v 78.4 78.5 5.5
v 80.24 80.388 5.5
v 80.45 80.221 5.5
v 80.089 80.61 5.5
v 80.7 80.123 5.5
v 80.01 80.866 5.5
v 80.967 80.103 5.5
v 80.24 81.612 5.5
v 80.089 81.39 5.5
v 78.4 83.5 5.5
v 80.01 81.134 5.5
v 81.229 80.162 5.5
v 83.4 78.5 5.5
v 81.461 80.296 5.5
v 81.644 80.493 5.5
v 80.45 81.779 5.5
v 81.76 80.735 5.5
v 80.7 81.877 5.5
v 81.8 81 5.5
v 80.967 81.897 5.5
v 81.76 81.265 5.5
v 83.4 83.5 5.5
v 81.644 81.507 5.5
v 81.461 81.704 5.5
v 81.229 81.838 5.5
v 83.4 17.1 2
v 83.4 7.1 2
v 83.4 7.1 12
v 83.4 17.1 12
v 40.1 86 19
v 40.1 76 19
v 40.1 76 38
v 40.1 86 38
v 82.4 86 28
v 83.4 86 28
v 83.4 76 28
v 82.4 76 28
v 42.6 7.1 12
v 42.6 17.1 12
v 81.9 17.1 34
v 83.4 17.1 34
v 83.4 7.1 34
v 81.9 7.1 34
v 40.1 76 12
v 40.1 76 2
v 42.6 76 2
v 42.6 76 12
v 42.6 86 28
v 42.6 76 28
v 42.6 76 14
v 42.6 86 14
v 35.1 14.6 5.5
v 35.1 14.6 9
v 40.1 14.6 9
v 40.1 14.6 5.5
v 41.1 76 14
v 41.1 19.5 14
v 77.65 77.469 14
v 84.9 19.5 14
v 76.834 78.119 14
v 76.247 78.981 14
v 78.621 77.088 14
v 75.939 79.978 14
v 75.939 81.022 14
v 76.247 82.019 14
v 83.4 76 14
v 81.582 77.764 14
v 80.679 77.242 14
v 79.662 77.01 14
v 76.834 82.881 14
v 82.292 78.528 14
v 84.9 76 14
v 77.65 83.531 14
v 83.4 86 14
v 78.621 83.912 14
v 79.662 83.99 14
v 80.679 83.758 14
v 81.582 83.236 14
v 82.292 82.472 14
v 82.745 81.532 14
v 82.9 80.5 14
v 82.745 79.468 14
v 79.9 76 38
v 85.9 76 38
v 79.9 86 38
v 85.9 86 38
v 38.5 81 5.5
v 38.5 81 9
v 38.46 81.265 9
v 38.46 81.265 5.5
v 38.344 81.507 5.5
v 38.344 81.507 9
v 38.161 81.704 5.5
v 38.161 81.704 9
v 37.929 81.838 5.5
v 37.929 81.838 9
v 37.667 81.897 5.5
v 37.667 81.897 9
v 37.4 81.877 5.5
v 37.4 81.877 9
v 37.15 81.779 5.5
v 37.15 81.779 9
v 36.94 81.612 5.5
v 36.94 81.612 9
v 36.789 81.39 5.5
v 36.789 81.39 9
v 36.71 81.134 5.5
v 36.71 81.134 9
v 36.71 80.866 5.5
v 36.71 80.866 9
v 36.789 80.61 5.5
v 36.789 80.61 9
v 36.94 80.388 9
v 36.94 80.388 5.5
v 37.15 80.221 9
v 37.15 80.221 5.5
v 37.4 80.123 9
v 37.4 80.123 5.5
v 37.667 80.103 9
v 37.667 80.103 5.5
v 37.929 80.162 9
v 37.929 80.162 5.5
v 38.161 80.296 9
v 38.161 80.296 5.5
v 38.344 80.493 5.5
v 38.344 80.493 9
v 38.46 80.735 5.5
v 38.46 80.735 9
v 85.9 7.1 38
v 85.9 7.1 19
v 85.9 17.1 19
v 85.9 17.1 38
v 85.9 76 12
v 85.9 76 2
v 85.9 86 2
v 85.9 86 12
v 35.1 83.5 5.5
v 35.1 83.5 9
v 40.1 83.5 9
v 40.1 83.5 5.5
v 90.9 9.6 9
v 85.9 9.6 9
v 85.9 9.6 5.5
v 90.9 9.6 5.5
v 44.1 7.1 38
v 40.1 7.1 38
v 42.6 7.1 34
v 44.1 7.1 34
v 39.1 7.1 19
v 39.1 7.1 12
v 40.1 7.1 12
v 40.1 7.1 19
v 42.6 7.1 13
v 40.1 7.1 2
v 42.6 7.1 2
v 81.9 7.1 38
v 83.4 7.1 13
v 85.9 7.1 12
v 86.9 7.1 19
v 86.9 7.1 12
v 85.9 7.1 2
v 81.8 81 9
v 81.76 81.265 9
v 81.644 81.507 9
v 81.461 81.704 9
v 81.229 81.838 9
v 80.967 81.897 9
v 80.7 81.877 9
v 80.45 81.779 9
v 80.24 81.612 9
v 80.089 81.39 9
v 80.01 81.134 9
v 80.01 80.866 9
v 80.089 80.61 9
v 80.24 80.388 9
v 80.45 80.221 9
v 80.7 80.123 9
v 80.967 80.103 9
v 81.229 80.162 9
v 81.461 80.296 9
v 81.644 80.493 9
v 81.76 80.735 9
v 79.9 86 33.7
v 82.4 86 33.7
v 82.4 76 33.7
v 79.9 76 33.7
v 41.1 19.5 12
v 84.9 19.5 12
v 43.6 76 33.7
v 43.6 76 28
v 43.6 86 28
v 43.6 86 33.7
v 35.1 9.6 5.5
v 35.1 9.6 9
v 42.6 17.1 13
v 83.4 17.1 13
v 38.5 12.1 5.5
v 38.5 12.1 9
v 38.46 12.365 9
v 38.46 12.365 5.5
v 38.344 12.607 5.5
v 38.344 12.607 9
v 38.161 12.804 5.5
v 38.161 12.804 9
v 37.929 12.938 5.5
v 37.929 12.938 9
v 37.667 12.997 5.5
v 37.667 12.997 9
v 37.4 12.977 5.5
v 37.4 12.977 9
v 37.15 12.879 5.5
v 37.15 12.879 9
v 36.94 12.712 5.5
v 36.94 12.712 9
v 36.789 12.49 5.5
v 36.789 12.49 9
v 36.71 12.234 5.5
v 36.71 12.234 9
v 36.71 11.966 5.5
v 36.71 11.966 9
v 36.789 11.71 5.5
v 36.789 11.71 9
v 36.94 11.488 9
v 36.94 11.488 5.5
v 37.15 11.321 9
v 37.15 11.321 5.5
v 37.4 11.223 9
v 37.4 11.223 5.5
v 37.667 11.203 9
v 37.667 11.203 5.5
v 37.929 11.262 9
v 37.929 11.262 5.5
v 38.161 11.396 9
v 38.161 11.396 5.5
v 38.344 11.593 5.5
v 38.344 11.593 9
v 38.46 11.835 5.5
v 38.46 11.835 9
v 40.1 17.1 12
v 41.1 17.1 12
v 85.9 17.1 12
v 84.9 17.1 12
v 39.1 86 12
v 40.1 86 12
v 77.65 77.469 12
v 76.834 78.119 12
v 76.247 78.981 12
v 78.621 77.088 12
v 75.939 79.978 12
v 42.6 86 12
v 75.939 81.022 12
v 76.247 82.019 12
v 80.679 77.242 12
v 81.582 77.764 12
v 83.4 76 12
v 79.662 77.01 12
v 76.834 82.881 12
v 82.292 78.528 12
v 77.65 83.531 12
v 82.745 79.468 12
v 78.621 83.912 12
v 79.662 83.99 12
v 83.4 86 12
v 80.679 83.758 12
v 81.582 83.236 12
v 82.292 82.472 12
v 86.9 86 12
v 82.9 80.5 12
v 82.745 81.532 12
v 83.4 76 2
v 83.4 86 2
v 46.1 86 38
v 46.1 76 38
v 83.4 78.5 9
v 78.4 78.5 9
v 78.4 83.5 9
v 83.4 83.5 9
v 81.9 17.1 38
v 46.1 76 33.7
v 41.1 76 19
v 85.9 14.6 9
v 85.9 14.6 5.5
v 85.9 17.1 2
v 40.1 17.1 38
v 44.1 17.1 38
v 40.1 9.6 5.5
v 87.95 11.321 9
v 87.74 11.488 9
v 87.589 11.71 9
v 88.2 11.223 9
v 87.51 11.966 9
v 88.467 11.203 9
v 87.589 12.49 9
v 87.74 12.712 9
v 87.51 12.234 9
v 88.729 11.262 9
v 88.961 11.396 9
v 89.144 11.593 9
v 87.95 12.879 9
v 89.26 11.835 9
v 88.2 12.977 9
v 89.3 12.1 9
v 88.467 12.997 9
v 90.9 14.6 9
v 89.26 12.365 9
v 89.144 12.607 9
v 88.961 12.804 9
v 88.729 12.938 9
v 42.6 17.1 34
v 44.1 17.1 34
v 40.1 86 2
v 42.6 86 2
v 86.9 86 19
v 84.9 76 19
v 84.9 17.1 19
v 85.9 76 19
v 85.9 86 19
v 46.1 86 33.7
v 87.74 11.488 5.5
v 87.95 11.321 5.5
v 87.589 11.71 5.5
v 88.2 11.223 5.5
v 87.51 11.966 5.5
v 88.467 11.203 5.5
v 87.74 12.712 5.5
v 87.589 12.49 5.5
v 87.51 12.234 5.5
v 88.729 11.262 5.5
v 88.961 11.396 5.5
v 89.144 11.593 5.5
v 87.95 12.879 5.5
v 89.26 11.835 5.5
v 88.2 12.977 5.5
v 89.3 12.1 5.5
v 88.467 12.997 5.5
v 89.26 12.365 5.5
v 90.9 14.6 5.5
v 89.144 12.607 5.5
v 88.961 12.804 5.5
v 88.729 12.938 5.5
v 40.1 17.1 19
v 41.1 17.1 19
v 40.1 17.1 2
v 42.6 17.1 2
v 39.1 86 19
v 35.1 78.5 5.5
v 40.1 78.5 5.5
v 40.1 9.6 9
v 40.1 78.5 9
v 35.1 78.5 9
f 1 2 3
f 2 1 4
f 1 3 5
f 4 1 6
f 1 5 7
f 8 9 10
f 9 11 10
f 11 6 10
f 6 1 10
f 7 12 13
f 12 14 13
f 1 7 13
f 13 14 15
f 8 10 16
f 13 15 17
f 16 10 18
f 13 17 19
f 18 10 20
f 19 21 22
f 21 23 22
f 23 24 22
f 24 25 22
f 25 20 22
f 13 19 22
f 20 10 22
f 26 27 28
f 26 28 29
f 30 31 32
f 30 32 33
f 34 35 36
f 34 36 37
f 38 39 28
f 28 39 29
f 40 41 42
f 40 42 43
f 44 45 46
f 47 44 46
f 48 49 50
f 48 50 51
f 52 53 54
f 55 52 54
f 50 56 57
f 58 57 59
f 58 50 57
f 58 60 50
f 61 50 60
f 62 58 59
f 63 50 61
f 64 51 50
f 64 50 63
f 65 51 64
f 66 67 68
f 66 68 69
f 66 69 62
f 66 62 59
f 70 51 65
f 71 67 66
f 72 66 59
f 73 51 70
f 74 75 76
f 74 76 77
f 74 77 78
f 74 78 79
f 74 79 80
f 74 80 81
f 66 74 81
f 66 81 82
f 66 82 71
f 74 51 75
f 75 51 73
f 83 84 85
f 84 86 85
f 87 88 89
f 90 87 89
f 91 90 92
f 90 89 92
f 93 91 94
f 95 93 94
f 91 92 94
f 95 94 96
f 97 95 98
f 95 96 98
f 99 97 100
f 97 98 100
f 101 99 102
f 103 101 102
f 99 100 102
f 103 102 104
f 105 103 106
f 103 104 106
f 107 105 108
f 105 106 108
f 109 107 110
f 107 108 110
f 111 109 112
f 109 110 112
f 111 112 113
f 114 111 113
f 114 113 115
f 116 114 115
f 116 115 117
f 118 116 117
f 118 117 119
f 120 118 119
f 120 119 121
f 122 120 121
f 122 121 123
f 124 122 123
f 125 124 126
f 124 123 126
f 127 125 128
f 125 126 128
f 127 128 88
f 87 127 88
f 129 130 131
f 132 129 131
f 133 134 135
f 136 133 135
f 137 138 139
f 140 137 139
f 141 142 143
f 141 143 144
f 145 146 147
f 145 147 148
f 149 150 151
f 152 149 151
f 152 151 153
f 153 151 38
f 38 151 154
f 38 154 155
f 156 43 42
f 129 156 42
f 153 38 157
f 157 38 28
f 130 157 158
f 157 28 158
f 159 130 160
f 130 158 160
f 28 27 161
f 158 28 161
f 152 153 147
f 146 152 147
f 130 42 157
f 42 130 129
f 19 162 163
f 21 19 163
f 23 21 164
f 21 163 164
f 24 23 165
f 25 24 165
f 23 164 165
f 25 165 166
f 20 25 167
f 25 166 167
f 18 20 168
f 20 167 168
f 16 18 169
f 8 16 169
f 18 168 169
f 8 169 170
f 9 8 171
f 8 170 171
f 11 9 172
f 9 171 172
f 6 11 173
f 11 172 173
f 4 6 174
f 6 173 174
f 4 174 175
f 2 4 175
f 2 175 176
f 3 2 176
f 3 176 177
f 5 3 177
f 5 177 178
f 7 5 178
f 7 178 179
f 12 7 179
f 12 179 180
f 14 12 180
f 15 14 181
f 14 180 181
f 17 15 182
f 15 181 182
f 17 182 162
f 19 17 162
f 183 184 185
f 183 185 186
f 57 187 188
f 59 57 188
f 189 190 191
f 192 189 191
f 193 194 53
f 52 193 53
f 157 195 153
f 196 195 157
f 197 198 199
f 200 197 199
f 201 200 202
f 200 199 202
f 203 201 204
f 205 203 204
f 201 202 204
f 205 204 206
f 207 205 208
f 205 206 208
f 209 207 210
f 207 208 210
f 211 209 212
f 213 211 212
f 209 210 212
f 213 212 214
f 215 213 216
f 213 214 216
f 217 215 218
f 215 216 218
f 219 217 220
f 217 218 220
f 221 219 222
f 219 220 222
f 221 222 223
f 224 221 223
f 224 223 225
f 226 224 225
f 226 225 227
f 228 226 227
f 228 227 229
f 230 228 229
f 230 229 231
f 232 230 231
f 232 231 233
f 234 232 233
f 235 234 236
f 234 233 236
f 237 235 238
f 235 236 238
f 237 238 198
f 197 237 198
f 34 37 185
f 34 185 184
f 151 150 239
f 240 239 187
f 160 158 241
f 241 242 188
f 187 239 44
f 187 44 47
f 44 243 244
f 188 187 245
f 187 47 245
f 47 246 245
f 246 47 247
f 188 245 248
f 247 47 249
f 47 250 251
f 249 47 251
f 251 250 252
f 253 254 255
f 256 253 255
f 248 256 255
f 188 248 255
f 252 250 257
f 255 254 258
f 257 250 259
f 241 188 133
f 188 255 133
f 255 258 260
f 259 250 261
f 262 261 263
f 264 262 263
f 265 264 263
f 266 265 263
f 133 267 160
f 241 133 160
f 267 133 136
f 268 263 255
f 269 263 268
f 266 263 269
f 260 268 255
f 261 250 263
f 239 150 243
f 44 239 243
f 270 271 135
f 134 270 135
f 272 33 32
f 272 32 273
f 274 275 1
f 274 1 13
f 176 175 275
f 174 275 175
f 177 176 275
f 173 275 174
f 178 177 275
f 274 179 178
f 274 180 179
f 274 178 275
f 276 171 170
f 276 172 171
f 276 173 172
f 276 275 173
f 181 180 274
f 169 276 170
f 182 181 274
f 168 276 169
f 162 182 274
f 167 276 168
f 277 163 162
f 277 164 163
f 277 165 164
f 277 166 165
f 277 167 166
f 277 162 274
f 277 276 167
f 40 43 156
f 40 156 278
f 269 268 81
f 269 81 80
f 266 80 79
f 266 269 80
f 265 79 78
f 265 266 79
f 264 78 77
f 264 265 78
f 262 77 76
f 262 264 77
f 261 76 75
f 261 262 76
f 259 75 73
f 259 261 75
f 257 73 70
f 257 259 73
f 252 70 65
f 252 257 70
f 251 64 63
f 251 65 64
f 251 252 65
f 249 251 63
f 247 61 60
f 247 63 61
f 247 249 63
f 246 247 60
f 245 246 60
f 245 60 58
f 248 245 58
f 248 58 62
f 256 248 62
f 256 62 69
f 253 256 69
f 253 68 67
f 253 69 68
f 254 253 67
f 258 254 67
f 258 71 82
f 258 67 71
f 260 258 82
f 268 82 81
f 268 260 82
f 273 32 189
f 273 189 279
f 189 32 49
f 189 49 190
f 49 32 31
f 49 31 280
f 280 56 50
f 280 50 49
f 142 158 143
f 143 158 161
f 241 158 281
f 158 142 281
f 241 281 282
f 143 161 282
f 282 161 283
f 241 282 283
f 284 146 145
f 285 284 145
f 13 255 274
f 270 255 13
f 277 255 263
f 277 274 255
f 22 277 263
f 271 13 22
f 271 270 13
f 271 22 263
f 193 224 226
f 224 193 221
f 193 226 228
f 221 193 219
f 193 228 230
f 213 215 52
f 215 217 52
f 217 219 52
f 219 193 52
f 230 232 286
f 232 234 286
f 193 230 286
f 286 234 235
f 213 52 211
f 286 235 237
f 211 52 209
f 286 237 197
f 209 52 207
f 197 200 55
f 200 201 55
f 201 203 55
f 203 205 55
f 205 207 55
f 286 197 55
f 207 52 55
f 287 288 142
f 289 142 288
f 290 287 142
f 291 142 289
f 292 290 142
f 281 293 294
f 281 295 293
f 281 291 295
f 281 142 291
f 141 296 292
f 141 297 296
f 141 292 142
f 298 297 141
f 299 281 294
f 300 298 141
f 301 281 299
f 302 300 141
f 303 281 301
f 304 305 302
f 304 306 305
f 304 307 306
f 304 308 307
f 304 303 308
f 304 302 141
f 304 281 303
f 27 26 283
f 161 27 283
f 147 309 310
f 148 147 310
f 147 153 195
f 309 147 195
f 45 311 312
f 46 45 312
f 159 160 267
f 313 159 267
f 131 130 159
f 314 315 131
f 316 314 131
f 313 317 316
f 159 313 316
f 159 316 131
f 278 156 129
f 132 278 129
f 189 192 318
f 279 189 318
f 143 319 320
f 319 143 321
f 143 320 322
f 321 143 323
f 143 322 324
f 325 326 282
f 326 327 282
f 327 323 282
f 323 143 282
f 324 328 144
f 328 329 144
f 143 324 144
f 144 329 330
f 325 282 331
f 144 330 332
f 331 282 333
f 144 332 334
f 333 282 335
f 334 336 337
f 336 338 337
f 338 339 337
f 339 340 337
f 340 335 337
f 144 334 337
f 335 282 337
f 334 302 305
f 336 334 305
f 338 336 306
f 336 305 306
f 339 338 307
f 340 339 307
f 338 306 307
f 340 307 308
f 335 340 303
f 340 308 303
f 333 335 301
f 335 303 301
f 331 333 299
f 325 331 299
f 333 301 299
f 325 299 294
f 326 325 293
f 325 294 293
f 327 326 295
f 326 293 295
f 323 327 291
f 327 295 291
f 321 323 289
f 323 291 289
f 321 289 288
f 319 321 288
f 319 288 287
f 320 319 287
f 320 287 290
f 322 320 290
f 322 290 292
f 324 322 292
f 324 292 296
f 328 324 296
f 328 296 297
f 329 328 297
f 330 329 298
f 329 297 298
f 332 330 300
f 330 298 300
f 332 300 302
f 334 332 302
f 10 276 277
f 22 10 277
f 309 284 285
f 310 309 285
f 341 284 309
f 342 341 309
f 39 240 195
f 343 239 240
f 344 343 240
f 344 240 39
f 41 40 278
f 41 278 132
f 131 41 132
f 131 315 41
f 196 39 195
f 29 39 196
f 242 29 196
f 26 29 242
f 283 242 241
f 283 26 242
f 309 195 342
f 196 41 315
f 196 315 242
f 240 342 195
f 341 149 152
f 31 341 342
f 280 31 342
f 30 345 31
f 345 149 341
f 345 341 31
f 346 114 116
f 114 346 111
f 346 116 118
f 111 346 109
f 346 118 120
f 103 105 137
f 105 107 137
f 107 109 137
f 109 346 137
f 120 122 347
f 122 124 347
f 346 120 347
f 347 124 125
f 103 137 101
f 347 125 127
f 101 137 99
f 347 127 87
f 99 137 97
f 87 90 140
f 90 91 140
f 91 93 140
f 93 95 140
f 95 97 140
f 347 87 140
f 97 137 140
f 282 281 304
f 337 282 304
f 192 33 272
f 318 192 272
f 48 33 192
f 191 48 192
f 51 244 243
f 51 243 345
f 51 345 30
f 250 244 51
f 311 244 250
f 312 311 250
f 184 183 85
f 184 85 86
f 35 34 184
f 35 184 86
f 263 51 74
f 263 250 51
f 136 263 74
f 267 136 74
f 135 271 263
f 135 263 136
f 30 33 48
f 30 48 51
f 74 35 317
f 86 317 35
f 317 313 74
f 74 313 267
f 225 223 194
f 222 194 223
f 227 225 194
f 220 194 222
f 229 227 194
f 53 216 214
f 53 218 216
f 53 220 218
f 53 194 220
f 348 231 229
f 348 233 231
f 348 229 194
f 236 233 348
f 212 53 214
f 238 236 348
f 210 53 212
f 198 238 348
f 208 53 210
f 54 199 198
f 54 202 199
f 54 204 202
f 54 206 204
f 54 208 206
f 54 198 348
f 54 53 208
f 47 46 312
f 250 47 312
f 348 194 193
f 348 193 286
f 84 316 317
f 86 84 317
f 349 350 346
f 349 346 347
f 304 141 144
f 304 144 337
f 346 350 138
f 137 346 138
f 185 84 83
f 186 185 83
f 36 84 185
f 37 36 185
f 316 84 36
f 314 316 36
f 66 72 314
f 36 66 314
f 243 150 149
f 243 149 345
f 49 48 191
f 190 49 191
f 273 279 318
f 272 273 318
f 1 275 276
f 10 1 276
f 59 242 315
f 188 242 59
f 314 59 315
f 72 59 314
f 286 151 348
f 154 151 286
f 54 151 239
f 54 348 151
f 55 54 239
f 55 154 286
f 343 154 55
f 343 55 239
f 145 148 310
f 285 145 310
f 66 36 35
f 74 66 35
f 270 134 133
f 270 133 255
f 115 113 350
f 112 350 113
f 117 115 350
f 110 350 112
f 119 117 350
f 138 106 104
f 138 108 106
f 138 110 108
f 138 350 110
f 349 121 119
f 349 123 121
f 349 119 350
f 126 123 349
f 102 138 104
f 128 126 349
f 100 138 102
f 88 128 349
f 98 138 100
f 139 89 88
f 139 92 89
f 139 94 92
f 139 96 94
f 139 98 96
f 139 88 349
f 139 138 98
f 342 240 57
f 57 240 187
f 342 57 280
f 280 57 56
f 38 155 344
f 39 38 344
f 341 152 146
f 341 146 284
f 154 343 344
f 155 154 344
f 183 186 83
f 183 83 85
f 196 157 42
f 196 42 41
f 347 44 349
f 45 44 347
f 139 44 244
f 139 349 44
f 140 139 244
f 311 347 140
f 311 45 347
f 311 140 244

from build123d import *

# Parameters (mm, degrees)
CYLINDER013_R     = 3.5
CYLINDER013_DEPTH = 15
CYLINDER012_R     = 0.9
CYLINDER012_DEPTH = 3.5
BOX039_W          = 5
BOX039_H          = 5
BOX039_DEPTH      = 3.5
BOX036_W          = 2.5
BOX036_H          = 10
BOX036_DEPTH      = 36
BOX031_W          = 1
BOX031_H          = 10
BOX031_DEPTH      = 10
BOX029_W          = 1.5
BOX029_H          = 10
BOX029_DEPTH      = 4
BOX032_W          = 2.5
BOX032_H          = 10
BOX032_DEPTH      = 4.3
BOX037_W          = 2
BOX037_H          = 78.9
BOX037_DEPTH      = 7
BOX033_W          = 2
BOX033_H          = 78.9
BOX033_DEPTH      = 7
BOX030_W          = 2.5
BOX030_H          = 10
BOX030_DEPTH      = 36
BOX034_W          = 45.8
BOX034_H          = 66.5
BOX034_DEPTH      = 2
BOX038_W          = 45.8
BOX038_H          = 10
BOX038_DEPTH      = 1
BOX035_W          = 2.5
BOX035_H          = 10
BOX035_DEPTH      = 36
BOX028_W          = 2.5
BOX028_H          = 10
BOX028_DEPTH      = 36


with BuildPart() as anchorhole003:
    # Cylinder013 → Cylinder013 (new body)
    with BuildSketch(Plane(origin=(2.5, 2.5, 0), x_dir=(1, 0, 0), z_dir=(0, 0, 1))):
        Circle(CYLINDER013_R)
    extrude(amount=CYLINDER013_DEPTH)


with BuildPart() as anchorhole003_1:
    # Clone024 placement: moved
    add(anchorhole003.part.moved(Location((76.9, 78, 9))))


with BuildPart() as anchorscrew:
    # Cylinder012 → Cylinder012 (new body)
    with BuildSketch(Plane(origin=(2.5, 2.5, 0), x_dir=(1, 0, 0), z_dir=(0, 0, 1))):
        Circle(CYLINDER012_R)
    extrude(amount=CYLINDER012_DEPTH)


with BuildPart() as anchor:
    # Box039 → Box039 (new body)
    with BuildSketch(Plane.XY):
        with Locations((2.5, 2.5)):
            Rectangle(BOX039_W, BOX039_H)
    extrude(amount=BOX039_DEPTH)

    # Cut010: cut AnchorScrew
    add(anchorscrew.part, mode=Mode.SUBTRACT)


with BuildPart() as anchor001:
    # Clone005 base: copy of Anchor
    add(anchor.part)


with BuildPart() as anchor001_1:
    # Clone005 placement: moved
    add(anchor001.part.moved(Location((85.9, 9.6, 2))))


with BuildPart() as part_mirroring004:
    # Part__Mirroring004: instance of anchor001
    add(anchor001_1.part.mirror(Plane(origin=(0, 0, 5.5), x_dir=(0, 1, 0), z_dir=(0, 0, 1))))


with BuildPart() as clone006:
    # Clone006 base: copy of Anchor
    add(anchor.part)


with BuildPart() as clone006_1:
    # Clone006 placement: moved
    add(clone006.part.moved(Location((78.4, 78.5, 2))))


with BuildPart() as part_mirroring005:
    # Part__Mirroring005: instance of Clone006
    add(clone006_1.part.mirror(Plane(origin=(0, 0, 5.5), x_dir=(0, 1, 0), z_dir=(0, 0, 1))))


with BuildPart() as cube028:
    # Box036 → Box036 (new body)
    with BuildSketch(Plane(origin=(83.4, 76, 2), x_dir=(1, 0, 0), z_dir=(0, 0, 1))):
        with Locations((1.25, 5)):
            Rectangle(BOX036_W, BOX036_H)
    extrude(amount=BOX036_DEPTH)


with BuildPart() as cube023:
    # Box031 → Box031 (new body)
    with BuildSketch(Plane(origin=(42.6, 76, 28), x_dir=(1, 0, 0), z_dir=(0, 0, 1))):
        with Locations((0.5, 5)):
            Rectangle(BOX031_W, BOX031_H)
    extrude(amount=BOX031_DEPTH)


with BuildPart() as cube021:
    # Box029 → Box029 (new body)
    with BuildSketch(Plane(origin=(42.6, 7.1, 34), x_dir=(1, 0, 0), z_dir=(0, 0, 1))):
        with Locations((0.75, 5)):
            Rectangle(BOX029_W, BOX029_H)
    extrude(amount=BOX029_DEPTH)


with BuildPart() as fusion004:
    # Box032 → Box032 (new body)
    with BuildSketch(Plane(origin=(43.6, 76, 33.7), x_dir=(1, 0, 0), z_dir=(0, 0, 1))):
        with Locations((1.25, 5)):
            Rectangle(BOX032_W, BOX032_H)
    extrude(amount=BOX032_DEPTH)

    # Fusion004: union Cube023, Cube021
    add(cube023.part)
    add(cube021.part)


with BuildPart() as part_mirroring003:
    # Part__Mirroring003: instance of Fusion004
    add(fusion004.part.mirror(Plane(origin=(63, 0, 0), x_dir=(0, -1, 0), z_dir=(1, 0, 0))))


with BuildPart() as anchor003:
    # Clone008 base: copy of Anchor
    add(anchor.part)


with BuildPart() as anchor003_1:
    # Clone008 placement: moved
    add(anchor003.part.moved(Location((35.1, 78.5, 2))))


with BuildPart() as part_mirroring007:
    # Part__Mirroring007: instance of Anchor003
    add(anchor003_1.part.mirror(Plane(origin=(0, 0, 5.5), x_dir=(0, 1, 0), z_dir=(0, 0, 1))))


with BuildPart() as cube029:
    # Box037 → Box037 (new body)
    with BuildSketch(Plane(origin=(84.9, 7.1, 12), x_dir=(1, 0, 0), z_dir=(0, 0, 1))):
        with Locations((1, 39.45)):
            Rectangle(BOX037_W, BOX037_H)
    extrude(amount=BOX037_DEPTH)


with BuildPart() as cube025:
    # Box033 → Box033 (new body)
    with BuildSketch(Plane(origin=(39.1, 7.1, 12), x_dir=(1, 0, 0), z_dir=(0, 0, 1))):
        with Locations((1, 39.45)):
            Rectangle(BOX033_W, BOX033_H)
    extrude(amount=BOX033_DEPTH)


with BuildPart() as cube022:
    # Box030 → Box030 (new body)
    with BuildSketch(Plane(origin=(40.1, 76, 2), x_dir=(1, 0, 0), z_dir=(0, 0, 1))):
        with Locations((1.25, 5)):
            Rectangle(BOX030_W, BOX030_H)
    extrude(amount=BOX030_DEPTH)


with BuildPart() as cube026:
    # Box034 → Box034 (new body)
    with BuildSketch(Plane(origin=(40.1, 19.5, 12), x_dir=(1, 0, 0), z_dir=(0, 0, 1))):
        with Locations((22.9, 33.25)):
            Rectangle(BOX034_W, BOX034_H)
    extrude(amount=BOX034_DEPTH)


with BuildPart() as anchor002:
    # Clone007 base: copy of Anchor
    add(anchor.part)


with BuildPart() as anchor002_1:
    # Clone007 placement: moved
    add(anchor002.part.moved(Location((35.1, 9.6, 2))))


with BuildPart() as part_mirroring006:
    # Part__Mirroring006: instance of Anchor002
    add(anchor002_1.part.mirror(Plane(origin=(0, 0, 5.5), x_dir=(0, 1, 0), z_dir=(0, 0, 1))))


with BuildPart() as cube030:
    # Box038 → Box038 (new body)
    with BuildSketch(Plane(origin=(40.1, 7.1, 12), x_dir=(1, 0, 0), z_dir=(0, 0, 1))):
        with Locations((22.9, 5)):
            Rectangle(BOX038_W, BOX038_H)
    extrude(amount=BOX038_DEPTH)


with BuildPart() as cube027:
    # Box035 → Box035 (new body)
    with BuildSketch(Plane(origin=(83.4, 7.1, 2), x_dir=(1, 0, 0), z_dir=(0, 0, 1))):
        with Locations((1.25, 5)):
            Rectangle(BOX035_W, BOX035_H)
    extrude(amount=BOX035_DEPTH)


with BuildPart() as flashercradle:
    # Box028 → Box028 (new body)
    with BuildSketch(Plane(origin=(40.1, 7.1, 2), x_dir=(1, 0, 0), z_dir=(0, 0, 1))):
        with Locations((1.25, 5)):
            Rectangle(BOX028_W, BOX028_H)
    extrude(amount=BOX028_DEPTH)

    # Fusion005: union Part__Mirroring004, Part__Mirroring005, Cube028, Part__Mirroring003, Part__Mirroring007, Cube029, Cube025, Cube022, Cube026, Part__Mirroring006, Cube030, Cube027, Fusion004
    add(part_mirroring004.part)
    add(part_mirroring005.part)
    add(cube028.part)
    add(part_mirroring003.part)
    add(part_mirroring007.part)
    add(cube029.part)
    add(cube025.part)
    add(cube022.part)
    add(cube026.part)
    add(part_mirroring006.part)
    add(cube030.part)
    add(cube027.part)
    add(fusion004.part)

    # Cut021: cut AnchorHole003
    add(anchorhole003_1.part, mode=Mode.SUBTRACT)


solid = flashercradle.part
